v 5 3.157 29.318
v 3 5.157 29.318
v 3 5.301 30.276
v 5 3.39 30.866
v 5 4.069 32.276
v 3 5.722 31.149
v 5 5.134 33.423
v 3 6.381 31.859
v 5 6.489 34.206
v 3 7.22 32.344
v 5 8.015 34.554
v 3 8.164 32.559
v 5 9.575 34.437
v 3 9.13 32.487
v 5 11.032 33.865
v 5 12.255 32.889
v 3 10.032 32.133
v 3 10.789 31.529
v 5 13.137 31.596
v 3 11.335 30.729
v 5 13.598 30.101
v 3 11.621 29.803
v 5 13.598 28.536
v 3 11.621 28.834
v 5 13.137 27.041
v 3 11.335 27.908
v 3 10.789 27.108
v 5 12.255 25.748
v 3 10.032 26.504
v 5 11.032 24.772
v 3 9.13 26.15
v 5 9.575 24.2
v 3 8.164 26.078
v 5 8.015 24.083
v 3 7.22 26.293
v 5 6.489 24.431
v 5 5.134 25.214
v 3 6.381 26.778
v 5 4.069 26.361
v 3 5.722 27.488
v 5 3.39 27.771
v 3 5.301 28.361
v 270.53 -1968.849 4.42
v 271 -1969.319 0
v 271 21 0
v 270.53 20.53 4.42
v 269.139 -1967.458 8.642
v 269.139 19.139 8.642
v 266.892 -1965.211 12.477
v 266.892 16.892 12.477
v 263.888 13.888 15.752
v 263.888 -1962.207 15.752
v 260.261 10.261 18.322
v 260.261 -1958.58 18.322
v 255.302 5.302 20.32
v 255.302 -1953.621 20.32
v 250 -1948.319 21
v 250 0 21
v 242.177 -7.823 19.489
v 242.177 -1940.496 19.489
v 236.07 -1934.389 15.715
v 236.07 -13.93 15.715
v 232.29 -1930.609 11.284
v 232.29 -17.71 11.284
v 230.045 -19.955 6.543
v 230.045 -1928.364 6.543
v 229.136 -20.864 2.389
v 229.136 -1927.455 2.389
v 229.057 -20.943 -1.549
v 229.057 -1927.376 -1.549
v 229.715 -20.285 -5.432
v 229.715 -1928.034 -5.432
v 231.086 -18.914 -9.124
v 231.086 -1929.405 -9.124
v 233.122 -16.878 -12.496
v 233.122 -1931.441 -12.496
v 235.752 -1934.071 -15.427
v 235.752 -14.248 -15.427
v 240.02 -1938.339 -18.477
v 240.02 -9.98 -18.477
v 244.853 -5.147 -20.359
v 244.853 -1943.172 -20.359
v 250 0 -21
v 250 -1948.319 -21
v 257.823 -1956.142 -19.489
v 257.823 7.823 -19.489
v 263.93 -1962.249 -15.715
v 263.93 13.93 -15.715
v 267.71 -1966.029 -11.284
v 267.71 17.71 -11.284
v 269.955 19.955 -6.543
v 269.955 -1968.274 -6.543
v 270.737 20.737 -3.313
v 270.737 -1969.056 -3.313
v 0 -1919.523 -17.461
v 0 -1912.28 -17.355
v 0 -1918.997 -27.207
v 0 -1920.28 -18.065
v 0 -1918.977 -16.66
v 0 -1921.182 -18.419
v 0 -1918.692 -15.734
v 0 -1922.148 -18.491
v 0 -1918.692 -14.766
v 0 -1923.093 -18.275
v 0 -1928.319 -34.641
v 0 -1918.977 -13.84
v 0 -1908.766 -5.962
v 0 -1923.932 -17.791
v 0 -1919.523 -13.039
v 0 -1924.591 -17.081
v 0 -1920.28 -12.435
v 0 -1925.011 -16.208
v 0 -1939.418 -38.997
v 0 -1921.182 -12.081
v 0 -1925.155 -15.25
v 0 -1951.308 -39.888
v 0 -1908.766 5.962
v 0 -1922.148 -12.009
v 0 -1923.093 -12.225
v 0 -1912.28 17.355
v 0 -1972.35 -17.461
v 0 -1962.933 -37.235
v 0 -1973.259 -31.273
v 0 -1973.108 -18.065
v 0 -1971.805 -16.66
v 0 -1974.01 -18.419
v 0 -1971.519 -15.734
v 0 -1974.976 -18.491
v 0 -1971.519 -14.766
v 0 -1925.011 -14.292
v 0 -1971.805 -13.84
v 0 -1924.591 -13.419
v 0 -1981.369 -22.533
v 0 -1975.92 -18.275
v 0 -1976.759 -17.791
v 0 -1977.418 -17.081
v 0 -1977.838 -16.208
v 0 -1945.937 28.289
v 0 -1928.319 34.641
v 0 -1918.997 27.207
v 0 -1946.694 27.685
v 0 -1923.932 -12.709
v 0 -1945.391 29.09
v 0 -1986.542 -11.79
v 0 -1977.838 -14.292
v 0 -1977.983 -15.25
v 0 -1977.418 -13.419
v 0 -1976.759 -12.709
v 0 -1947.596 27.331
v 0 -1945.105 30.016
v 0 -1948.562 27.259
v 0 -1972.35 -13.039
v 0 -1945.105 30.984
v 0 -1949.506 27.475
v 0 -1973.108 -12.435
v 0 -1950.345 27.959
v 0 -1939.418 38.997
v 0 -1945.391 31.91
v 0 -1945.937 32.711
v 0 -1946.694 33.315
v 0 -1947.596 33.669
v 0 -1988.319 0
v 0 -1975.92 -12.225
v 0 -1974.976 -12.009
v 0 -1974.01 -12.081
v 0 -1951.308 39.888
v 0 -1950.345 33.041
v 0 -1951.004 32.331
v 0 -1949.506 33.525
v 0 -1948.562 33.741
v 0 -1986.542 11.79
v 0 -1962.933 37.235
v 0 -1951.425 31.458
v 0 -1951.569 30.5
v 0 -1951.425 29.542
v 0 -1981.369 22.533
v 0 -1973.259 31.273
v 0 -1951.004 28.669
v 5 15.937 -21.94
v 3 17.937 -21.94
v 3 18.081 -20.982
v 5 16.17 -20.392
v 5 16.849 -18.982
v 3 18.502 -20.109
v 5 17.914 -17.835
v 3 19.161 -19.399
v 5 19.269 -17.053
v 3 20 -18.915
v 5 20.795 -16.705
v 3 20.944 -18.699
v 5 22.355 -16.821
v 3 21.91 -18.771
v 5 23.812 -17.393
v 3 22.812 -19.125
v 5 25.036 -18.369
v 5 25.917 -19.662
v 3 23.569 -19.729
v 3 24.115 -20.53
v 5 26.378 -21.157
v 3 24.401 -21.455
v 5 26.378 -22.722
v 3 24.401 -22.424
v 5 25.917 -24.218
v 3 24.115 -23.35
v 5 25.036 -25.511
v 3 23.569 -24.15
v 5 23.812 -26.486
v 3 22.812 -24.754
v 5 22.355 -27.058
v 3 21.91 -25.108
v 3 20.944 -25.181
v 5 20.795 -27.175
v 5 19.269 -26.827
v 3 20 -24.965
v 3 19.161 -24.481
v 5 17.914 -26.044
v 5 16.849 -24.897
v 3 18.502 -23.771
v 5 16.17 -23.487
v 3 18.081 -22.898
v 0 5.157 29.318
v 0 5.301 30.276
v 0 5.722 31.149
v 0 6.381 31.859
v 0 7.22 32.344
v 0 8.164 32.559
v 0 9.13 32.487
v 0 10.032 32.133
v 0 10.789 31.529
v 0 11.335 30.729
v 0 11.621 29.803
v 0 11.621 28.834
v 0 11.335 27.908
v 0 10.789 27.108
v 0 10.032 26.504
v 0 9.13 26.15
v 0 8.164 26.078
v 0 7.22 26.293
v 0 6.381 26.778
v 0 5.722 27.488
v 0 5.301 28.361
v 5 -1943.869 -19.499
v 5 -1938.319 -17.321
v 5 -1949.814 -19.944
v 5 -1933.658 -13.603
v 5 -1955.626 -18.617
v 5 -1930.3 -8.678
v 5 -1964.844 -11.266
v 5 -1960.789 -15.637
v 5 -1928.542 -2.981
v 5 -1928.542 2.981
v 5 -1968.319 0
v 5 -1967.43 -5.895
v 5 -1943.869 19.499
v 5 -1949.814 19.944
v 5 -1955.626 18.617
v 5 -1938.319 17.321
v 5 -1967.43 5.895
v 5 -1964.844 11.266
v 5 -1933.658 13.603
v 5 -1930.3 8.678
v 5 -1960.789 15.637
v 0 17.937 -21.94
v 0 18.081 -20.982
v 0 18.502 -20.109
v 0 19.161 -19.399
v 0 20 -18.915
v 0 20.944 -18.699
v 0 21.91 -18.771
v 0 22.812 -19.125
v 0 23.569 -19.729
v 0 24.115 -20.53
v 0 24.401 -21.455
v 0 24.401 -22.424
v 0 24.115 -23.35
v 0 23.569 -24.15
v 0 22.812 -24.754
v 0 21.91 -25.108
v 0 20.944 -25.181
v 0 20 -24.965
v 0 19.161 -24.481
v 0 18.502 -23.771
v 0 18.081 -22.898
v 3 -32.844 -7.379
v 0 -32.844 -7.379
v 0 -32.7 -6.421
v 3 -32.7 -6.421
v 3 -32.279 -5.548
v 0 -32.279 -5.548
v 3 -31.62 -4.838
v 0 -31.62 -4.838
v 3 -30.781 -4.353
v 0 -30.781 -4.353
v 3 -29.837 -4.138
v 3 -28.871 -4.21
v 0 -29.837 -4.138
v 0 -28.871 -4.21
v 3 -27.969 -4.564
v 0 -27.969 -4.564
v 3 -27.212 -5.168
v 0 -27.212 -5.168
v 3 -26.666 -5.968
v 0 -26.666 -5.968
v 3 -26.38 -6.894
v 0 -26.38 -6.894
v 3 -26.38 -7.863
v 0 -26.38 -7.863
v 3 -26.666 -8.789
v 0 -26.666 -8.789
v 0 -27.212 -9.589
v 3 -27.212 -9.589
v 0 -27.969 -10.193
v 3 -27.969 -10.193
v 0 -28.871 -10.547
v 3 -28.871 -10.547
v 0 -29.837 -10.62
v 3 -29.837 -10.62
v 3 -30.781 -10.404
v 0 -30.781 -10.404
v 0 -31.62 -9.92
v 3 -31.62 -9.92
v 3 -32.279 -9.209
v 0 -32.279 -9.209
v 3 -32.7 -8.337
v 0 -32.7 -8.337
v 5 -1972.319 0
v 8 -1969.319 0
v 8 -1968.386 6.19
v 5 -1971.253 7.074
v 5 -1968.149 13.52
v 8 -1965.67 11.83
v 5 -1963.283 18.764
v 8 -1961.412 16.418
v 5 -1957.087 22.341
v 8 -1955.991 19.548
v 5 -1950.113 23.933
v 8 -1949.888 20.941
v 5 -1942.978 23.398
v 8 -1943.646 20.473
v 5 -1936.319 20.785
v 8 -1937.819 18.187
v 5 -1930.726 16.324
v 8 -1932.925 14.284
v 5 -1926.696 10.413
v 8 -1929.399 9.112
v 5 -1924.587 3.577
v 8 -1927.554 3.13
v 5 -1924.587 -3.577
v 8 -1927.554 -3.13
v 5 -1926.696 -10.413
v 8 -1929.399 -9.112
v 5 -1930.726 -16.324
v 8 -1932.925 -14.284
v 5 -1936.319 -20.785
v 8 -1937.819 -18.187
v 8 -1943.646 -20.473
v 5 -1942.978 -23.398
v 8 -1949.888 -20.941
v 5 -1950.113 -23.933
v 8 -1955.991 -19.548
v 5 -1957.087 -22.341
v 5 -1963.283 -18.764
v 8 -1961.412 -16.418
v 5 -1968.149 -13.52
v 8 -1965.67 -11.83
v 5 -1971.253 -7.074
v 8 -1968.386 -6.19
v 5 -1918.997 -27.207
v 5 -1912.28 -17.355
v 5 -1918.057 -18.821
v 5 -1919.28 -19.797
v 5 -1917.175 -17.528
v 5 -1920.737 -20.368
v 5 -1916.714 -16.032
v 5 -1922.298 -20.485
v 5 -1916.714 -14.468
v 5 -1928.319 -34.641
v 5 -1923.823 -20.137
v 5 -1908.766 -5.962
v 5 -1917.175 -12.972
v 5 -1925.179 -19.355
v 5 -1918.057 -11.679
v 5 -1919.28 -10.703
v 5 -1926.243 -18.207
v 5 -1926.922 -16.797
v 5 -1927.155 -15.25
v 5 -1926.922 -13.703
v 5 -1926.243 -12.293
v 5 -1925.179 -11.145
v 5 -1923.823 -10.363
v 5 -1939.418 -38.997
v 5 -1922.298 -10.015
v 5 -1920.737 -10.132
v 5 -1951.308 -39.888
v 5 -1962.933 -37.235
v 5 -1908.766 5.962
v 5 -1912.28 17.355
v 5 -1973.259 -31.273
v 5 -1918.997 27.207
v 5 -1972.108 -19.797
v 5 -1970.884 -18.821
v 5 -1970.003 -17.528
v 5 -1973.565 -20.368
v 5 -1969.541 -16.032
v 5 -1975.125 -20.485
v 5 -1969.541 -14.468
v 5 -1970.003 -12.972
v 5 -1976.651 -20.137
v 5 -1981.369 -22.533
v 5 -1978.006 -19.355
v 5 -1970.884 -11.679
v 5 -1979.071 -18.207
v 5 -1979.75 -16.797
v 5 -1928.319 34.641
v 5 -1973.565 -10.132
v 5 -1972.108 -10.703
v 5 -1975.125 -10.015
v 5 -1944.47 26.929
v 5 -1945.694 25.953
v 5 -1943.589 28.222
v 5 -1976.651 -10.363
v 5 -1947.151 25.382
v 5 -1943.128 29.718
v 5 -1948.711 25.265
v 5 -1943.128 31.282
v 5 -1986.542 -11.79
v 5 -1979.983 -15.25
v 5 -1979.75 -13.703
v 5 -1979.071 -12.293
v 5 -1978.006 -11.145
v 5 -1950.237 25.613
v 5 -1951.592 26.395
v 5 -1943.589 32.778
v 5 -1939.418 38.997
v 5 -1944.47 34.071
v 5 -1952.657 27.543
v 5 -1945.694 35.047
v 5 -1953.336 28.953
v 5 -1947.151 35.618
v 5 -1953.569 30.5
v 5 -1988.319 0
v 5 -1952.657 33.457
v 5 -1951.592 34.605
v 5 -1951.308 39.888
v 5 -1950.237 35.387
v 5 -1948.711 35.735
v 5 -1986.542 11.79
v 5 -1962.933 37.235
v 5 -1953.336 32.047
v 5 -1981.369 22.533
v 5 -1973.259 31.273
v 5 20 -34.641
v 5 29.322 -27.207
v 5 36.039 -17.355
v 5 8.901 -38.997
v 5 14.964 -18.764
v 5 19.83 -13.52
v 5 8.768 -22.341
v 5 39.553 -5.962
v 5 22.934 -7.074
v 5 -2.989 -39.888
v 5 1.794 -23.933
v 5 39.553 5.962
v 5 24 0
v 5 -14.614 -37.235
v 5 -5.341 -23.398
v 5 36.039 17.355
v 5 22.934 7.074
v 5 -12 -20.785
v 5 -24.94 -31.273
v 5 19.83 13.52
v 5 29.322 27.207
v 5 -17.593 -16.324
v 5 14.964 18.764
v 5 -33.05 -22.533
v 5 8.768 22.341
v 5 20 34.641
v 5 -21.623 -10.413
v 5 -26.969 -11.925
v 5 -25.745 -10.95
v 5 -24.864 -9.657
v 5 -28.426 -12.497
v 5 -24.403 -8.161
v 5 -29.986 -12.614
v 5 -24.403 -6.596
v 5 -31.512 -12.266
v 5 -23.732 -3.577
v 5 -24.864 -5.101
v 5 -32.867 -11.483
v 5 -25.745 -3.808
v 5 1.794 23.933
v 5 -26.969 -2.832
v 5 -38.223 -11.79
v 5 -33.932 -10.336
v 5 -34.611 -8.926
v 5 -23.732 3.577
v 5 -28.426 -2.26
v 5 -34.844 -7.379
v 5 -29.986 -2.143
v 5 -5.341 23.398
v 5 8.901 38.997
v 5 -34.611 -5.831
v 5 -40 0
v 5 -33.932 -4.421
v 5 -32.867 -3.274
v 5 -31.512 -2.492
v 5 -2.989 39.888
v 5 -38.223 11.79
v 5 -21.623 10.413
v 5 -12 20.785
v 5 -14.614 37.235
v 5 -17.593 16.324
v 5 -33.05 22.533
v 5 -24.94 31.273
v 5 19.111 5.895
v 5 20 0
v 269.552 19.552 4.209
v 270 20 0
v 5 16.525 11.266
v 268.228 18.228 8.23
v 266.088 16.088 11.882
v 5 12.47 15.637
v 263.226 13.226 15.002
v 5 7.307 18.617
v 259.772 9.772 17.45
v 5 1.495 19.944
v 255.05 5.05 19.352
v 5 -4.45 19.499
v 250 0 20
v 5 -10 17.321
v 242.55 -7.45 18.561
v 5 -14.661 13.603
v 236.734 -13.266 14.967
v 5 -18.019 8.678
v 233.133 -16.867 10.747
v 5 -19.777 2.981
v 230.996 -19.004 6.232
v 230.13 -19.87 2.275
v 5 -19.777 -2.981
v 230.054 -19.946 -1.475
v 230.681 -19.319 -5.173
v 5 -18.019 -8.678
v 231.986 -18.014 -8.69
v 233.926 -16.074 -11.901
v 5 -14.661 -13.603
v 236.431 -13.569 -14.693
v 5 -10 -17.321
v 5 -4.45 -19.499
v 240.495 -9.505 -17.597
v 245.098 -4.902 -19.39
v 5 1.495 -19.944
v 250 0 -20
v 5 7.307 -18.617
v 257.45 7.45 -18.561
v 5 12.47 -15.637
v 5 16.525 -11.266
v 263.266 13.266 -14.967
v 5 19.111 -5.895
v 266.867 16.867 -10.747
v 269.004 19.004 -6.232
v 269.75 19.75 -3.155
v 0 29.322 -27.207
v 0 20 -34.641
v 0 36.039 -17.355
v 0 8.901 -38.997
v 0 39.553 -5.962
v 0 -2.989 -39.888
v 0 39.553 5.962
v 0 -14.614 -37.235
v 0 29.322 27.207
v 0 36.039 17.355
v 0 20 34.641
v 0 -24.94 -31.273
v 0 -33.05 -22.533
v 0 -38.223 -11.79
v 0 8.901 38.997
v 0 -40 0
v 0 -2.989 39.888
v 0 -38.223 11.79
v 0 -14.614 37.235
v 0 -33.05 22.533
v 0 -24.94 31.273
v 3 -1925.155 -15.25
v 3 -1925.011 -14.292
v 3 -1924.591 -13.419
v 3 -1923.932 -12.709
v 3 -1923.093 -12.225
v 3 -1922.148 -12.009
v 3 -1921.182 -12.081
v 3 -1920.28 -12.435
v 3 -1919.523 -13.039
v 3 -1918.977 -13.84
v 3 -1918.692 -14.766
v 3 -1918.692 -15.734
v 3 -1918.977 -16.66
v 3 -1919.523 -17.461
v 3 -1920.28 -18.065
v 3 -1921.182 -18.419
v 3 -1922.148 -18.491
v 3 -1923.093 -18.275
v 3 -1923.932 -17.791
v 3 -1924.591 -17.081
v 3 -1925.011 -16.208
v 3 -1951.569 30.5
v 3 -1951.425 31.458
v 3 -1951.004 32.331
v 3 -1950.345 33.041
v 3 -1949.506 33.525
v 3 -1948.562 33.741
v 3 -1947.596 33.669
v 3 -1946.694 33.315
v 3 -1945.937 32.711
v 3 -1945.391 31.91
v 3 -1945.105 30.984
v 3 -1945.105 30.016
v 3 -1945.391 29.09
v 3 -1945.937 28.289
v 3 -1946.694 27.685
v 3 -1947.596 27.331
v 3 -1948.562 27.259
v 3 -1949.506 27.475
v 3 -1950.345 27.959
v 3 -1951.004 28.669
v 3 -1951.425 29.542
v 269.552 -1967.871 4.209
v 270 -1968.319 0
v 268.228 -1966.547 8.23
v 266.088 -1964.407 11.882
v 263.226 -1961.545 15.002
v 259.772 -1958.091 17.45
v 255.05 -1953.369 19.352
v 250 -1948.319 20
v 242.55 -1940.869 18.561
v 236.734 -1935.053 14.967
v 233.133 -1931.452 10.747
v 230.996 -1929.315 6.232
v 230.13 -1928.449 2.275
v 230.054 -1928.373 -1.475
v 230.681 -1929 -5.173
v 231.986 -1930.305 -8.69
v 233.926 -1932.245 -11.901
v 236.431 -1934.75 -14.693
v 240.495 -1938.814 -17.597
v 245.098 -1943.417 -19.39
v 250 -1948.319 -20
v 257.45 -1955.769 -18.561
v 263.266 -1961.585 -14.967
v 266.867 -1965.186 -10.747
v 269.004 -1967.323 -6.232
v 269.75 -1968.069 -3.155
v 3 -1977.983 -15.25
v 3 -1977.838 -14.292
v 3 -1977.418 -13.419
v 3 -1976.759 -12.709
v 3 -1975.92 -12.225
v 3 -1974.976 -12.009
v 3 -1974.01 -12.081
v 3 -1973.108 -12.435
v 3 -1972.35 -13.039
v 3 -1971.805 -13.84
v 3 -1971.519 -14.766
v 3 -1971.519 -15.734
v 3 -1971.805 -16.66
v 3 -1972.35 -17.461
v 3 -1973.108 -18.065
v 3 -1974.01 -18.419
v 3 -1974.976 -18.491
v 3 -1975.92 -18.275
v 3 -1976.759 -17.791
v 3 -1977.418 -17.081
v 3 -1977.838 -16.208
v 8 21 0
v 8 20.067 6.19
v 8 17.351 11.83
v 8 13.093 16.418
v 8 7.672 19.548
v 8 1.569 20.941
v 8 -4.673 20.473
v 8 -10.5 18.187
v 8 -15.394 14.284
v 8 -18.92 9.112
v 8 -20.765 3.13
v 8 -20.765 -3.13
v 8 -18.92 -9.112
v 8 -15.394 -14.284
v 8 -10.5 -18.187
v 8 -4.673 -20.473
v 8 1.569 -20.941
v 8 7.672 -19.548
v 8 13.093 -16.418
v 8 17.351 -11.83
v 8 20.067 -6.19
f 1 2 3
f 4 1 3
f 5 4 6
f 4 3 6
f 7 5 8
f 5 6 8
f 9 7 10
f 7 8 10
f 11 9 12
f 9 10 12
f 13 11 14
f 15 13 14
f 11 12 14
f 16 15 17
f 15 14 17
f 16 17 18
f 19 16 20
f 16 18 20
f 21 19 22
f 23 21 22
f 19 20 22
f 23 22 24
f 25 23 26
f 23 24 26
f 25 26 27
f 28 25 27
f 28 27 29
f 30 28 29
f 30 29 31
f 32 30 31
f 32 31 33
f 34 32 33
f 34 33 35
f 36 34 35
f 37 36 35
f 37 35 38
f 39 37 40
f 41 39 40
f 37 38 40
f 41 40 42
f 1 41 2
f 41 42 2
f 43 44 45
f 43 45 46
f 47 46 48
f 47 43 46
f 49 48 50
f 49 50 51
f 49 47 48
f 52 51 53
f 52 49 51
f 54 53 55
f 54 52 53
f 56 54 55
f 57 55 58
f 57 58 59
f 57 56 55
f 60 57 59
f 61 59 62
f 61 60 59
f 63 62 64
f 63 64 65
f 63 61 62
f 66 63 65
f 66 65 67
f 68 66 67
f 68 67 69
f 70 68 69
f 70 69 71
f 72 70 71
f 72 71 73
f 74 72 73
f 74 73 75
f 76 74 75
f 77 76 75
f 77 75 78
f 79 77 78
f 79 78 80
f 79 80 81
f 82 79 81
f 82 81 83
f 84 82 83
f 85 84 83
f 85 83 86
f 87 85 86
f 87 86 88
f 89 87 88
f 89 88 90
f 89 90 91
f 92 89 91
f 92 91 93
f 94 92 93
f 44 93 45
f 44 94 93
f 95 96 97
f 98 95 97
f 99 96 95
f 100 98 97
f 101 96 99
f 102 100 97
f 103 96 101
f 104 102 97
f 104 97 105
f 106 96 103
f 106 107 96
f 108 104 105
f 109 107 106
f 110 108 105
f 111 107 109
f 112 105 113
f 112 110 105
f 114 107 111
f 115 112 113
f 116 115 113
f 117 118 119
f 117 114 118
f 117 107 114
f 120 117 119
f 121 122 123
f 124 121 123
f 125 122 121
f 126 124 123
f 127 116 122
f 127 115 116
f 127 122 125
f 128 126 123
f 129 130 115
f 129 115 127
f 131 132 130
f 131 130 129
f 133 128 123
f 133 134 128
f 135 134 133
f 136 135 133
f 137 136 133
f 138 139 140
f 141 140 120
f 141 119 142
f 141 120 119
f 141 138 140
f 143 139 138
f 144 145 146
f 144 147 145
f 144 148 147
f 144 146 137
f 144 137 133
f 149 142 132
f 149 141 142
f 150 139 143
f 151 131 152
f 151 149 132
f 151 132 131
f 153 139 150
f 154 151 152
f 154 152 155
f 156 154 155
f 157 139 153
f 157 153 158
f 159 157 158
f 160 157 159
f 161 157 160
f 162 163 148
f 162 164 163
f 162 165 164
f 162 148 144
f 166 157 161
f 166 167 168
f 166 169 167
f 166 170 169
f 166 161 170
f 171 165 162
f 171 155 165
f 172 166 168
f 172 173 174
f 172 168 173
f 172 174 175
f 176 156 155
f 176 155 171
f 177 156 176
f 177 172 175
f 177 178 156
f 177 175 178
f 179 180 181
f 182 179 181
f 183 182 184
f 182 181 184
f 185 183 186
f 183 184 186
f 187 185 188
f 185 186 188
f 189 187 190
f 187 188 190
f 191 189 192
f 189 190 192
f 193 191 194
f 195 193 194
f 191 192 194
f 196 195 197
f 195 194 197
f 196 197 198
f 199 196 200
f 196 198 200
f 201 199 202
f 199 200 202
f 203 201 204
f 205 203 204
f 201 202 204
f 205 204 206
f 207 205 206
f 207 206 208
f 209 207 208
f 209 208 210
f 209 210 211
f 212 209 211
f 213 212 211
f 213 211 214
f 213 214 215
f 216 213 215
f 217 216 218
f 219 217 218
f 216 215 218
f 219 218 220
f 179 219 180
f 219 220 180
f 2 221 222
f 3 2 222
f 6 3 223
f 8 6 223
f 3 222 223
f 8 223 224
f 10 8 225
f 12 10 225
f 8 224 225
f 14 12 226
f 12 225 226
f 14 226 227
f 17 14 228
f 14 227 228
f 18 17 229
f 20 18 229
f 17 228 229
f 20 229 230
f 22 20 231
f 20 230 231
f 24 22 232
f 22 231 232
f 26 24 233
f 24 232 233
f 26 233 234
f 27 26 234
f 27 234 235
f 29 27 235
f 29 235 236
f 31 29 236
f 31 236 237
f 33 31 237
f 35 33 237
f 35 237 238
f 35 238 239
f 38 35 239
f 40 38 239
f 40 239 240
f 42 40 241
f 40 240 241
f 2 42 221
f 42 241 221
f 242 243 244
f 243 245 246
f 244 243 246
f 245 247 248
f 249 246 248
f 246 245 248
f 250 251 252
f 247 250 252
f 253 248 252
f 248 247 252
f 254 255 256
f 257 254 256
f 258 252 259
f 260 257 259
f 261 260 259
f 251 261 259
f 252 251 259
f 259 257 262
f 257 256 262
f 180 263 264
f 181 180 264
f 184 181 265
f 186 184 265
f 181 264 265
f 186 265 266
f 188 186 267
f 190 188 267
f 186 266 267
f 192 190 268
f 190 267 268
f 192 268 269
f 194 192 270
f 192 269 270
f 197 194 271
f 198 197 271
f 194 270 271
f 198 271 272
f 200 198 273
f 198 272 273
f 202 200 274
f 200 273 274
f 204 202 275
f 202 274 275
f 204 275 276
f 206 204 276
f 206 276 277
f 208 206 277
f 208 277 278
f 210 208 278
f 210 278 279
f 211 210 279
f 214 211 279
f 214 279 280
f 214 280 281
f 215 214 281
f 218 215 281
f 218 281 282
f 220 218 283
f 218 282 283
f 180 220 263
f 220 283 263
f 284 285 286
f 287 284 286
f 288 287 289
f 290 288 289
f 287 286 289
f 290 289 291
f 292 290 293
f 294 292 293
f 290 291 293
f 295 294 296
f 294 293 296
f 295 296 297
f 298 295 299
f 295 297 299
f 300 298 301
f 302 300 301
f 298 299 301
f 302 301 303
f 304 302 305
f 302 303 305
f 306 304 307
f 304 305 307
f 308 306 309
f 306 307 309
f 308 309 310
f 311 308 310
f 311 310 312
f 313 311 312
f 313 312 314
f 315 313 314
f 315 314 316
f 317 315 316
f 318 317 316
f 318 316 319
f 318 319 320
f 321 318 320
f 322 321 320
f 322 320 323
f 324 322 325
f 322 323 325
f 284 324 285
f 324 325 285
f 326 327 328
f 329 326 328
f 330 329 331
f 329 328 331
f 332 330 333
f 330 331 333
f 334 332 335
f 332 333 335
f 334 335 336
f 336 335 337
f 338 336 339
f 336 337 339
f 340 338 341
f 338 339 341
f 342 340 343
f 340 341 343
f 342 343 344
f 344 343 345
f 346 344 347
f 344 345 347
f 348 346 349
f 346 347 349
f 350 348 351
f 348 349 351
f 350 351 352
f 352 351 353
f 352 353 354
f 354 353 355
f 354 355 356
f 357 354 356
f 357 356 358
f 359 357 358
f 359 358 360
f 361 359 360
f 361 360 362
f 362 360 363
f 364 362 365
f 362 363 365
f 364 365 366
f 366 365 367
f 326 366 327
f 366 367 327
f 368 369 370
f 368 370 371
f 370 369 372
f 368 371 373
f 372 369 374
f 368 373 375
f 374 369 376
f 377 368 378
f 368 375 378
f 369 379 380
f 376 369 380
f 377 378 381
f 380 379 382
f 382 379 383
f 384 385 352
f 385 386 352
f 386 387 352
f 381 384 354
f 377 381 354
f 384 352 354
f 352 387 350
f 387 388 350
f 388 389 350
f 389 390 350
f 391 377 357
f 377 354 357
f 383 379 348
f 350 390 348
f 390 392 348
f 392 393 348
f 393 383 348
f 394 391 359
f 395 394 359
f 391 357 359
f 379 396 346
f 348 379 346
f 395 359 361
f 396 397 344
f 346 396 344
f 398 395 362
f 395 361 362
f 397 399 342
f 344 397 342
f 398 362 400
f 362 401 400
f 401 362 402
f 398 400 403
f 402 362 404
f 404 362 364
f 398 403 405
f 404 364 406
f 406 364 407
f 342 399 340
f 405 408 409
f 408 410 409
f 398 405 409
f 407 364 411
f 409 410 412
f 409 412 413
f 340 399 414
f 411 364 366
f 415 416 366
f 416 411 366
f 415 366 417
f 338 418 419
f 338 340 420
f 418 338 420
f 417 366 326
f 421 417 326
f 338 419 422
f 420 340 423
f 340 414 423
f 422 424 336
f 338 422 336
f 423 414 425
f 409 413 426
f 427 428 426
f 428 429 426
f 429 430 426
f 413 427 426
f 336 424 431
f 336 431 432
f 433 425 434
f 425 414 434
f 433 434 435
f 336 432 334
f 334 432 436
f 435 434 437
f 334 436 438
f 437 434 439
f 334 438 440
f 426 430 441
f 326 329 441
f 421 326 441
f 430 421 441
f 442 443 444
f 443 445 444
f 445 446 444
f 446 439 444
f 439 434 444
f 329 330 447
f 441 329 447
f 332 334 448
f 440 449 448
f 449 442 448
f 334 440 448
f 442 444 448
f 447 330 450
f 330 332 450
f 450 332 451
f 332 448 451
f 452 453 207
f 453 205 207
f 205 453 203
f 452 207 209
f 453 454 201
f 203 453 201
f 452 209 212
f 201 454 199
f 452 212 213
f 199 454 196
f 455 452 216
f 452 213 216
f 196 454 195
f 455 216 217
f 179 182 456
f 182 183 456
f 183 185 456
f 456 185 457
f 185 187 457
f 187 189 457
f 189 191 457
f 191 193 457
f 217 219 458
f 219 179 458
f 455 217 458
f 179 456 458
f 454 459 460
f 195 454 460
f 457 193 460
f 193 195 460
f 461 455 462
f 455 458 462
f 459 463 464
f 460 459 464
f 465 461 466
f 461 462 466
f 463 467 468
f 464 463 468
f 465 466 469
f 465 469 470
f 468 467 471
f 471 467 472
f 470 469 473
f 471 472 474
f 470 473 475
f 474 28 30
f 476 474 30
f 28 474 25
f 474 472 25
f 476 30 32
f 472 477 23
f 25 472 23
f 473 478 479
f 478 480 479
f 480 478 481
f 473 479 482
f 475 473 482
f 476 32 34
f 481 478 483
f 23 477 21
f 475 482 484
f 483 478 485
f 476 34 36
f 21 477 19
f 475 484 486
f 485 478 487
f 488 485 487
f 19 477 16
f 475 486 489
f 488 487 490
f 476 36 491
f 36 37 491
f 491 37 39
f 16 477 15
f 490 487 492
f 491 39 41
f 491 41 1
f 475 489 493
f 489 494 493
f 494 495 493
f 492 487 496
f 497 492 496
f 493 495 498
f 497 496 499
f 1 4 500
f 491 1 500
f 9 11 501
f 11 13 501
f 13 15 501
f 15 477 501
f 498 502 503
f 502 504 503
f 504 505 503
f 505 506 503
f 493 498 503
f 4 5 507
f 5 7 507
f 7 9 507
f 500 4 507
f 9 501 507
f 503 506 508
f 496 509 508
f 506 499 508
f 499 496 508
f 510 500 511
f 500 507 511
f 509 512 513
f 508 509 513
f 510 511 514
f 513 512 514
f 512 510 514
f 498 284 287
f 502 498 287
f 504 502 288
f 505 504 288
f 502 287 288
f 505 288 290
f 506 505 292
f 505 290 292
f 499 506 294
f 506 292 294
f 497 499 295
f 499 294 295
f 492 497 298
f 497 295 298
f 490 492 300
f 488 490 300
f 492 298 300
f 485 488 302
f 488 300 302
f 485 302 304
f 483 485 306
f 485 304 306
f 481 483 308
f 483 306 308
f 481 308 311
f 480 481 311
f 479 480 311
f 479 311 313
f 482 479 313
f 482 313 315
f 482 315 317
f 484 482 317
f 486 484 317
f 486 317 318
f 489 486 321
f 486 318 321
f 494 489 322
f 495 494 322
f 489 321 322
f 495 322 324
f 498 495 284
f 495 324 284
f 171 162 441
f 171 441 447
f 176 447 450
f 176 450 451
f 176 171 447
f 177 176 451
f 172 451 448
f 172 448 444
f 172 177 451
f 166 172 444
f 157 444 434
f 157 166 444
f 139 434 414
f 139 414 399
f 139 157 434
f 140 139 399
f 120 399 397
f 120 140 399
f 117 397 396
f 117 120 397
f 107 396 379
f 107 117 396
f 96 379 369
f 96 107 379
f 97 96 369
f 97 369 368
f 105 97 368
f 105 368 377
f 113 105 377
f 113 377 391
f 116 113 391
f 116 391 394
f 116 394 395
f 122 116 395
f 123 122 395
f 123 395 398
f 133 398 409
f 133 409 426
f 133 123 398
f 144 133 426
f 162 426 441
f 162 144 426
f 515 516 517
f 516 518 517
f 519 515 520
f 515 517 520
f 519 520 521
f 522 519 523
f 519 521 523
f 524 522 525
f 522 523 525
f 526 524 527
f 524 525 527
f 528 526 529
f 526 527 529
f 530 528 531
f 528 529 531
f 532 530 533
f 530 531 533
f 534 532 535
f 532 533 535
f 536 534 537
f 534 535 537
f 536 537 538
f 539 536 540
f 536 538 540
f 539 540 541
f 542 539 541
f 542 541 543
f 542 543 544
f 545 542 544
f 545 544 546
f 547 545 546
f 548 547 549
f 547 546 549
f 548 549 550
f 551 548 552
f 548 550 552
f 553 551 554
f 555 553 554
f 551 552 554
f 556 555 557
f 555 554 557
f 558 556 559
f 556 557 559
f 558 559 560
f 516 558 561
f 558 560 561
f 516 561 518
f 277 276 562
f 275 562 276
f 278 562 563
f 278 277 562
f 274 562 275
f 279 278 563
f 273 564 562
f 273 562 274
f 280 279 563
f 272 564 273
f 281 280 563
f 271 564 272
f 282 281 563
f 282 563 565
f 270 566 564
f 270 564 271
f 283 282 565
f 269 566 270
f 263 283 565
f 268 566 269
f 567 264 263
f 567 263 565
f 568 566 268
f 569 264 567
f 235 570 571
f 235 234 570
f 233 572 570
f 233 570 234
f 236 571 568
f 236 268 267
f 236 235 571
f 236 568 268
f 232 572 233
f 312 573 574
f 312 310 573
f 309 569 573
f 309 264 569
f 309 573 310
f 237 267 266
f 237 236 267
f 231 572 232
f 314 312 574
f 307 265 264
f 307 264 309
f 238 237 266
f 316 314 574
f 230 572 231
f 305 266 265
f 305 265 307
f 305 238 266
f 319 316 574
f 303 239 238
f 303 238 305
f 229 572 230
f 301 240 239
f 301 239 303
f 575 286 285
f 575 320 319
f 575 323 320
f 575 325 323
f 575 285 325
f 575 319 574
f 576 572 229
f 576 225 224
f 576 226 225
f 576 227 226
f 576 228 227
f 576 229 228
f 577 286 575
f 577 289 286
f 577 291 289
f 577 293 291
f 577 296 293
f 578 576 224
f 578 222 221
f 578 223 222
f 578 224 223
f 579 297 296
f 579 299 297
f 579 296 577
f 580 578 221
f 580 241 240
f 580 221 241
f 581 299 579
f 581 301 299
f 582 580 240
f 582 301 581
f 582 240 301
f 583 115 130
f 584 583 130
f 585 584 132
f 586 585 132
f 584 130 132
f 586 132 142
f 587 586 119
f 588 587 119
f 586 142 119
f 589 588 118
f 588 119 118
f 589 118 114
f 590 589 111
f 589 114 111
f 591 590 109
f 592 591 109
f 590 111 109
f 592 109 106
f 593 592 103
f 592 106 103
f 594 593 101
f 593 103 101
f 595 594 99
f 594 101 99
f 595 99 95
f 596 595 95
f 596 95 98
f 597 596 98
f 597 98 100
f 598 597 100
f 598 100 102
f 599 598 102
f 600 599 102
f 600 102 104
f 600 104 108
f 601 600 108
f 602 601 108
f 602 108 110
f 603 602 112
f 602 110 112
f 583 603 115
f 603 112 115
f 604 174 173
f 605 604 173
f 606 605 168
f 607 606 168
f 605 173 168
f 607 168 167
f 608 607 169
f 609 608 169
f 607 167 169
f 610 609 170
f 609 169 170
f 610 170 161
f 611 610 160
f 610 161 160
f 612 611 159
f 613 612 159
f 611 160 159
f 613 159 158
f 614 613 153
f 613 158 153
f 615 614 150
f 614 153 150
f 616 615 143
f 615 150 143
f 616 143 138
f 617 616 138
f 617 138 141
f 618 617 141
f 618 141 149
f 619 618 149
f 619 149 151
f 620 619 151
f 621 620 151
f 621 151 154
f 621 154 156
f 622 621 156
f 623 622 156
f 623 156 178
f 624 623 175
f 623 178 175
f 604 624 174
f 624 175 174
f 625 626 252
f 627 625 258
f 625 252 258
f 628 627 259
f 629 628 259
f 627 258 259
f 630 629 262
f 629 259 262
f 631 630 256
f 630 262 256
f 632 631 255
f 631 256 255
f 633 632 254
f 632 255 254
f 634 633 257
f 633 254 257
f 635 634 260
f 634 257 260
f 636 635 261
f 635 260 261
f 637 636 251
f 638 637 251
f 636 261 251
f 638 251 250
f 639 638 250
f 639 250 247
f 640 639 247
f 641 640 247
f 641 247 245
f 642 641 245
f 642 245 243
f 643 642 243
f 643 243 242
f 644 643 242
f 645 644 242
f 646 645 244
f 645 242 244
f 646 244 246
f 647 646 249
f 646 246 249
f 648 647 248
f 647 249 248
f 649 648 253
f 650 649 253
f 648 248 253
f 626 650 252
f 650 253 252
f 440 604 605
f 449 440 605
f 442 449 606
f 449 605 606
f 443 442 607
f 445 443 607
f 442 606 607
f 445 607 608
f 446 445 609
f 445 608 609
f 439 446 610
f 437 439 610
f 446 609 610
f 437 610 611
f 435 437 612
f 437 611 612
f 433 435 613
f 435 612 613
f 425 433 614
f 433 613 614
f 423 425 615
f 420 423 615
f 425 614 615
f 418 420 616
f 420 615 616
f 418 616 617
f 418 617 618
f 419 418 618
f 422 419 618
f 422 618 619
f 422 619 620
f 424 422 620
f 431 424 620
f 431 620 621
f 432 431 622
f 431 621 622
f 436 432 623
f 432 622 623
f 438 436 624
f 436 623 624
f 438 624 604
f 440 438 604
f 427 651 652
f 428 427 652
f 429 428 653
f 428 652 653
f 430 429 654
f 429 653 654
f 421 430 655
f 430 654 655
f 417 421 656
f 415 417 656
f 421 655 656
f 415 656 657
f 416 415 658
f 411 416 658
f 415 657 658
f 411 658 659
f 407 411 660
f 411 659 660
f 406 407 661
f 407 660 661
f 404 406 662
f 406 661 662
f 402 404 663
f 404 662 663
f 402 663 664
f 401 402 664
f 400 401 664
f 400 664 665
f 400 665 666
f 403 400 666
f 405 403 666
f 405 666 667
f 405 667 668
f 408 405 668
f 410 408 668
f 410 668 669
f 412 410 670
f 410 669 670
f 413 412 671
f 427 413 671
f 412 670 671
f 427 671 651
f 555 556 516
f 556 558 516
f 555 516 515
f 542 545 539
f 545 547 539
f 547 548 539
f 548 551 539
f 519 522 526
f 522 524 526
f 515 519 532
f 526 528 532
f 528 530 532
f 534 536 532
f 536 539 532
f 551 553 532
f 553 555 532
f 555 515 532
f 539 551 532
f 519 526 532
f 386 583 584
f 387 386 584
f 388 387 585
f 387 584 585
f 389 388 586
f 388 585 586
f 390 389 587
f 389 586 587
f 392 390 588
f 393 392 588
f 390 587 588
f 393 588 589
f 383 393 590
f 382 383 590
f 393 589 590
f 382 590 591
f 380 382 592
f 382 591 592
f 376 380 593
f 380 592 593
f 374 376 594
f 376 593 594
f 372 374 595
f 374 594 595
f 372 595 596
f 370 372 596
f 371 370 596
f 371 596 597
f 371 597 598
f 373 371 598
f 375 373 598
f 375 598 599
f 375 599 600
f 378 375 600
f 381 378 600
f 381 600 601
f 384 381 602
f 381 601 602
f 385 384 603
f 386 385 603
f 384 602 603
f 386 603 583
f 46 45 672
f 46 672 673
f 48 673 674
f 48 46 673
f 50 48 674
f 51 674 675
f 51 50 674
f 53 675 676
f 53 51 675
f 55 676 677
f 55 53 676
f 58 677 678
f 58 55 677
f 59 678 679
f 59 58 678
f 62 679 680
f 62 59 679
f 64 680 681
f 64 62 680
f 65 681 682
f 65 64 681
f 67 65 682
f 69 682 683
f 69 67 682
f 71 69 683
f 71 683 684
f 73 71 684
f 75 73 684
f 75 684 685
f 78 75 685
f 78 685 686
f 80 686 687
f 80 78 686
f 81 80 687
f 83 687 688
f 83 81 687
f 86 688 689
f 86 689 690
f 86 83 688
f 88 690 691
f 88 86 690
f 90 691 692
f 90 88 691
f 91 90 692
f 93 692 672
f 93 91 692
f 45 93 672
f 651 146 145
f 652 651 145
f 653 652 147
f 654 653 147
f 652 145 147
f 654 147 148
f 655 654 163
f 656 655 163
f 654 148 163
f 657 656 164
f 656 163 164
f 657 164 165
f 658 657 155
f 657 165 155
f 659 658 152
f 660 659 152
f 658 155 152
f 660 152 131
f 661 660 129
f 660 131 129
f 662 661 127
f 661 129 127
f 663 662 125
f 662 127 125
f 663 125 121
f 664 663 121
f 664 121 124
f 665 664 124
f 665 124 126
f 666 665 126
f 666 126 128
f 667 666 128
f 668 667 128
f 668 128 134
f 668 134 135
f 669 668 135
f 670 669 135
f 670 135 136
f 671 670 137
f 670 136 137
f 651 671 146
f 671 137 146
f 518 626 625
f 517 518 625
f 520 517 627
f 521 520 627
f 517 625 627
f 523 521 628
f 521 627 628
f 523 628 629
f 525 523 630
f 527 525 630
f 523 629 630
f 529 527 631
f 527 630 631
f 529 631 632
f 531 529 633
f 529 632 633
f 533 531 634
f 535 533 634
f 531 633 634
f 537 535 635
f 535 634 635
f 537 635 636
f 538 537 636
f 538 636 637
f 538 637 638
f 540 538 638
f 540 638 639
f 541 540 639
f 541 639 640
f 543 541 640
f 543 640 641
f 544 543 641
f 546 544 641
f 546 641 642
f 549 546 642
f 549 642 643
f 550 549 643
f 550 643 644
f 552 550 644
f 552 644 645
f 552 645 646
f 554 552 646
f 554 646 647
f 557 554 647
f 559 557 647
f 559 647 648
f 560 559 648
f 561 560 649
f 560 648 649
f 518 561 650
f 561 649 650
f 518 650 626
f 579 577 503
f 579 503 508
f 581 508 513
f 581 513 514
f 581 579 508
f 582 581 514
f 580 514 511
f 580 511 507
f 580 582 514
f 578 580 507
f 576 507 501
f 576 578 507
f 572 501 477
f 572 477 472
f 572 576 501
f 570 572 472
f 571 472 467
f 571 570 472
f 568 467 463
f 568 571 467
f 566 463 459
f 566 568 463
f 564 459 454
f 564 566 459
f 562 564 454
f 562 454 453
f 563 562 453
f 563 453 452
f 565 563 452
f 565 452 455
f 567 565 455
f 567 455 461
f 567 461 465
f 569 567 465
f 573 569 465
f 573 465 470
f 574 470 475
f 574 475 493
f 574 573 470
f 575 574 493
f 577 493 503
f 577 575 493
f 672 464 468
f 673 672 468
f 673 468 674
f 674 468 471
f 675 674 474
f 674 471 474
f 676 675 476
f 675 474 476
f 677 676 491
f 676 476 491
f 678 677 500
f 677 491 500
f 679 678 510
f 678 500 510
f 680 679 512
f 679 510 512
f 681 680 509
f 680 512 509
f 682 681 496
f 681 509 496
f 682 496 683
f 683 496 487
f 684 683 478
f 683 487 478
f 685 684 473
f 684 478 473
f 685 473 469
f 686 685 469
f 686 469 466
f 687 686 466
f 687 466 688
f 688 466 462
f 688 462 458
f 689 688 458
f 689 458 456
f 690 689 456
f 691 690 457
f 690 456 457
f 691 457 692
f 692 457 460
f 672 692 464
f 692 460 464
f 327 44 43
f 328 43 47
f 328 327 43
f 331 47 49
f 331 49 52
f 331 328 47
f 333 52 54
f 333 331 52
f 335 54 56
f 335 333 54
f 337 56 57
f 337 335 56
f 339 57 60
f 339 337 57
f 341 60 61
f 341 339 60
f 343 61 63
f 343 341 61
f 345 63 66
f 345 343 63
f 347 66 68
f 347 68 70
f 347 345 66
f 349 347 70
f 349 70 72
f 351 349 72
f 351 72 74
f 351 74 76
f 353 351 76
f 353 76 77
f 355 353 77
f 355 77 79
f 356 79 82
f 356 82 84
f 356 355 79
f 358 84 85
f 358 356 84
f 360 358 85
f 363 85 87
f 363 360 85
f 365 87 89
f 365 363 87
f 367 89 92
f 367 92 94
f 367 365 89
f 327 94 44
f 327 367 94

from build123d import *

# Parameters (mm, degrees)
F0_R     = 21
F0_R_2   = 20
F3_R     = 40
F3_R_2   = 3.25
F4_DEPTH = 5
F5_SIZE  = 2
F6_SIZE  = 3


with BuildPart() as f2:
    # F2: sweep along a path in F1
    with BuildLine(Plane.XY) as f2_path:
        Line((0, 0), (250, 0))
        Line((250, 0), (250, -1948.319))
        Line((250, -1948.319), (0, -1948.319))
    # F0 (on Right) → F2 (sweep)
    with BuildSketch(Plane.YZ):
        Circle(F0_R)
        Circle(F0_R_2, mode=Mode.SUBTRACT)
    sweep(path=f2_path.line, transition=Transition.RIGHT)

    # F3 (on face) → F4 (join)
    with BuildSketch(Plane(origin=(0, 0, 0), x_dir=(0, -1, 0), z_dir=(-1, 0, 0))):
        with Locations((1948.319, 0)):
            Circle(F3_R)
        with Locations((1921.9052251846, -15.25)):
            Circle(F3_R_2, mode=Mode.SUBTRACT)
        with Locations((1974.7327748154, -15.25)):
            Circle(F3_R_2, mode=Mode.SUBTRACT)
        with Locations((1948.319, 30.5)):
            Circle(F3_R_2, mode=Mode.SUBTRACT)
        Circle(F3_R)
        with Locations((-21.187080299, -21.9398639103)):
            Circle(F3_R_2, mode=Mode.SUBTRACT)
        with Locations((29.5940196514, -7.3786178158)):
            Circle(F3_R_2, mode=Mode.SUBTRACT)
        with Locations((-8.4069393524, 29.3184817261)):
            Circle(F3_R_2, mode=Mode.SUBTRACT)
    extrude(amount=-F4_DEPTH)

    # F5
    f5_edges = [f2.edges().sort_by_distance(p)[0] for p in [
        (5, 11.656939, 29.318482),
        (5, -26.34402, -7.378618),
        (5, 24.43708, -21.939864),
        (5, -1945.069, 30.5),
        (5, -1971.482775, -15.25),
        (5, -1918.655225, -15.25),
    ]]
    chamfer(f5_edges, length=F5_SIZE)

    # F6
    f6_edges = [f2.edges().sort_by_distance(p)[0] for p in [
        (5, -21, 0),
        (5, -1927.319, 0),
    ]]
    chamfer(f6_edges, length=F6_SIZE)


solid = f2.part
